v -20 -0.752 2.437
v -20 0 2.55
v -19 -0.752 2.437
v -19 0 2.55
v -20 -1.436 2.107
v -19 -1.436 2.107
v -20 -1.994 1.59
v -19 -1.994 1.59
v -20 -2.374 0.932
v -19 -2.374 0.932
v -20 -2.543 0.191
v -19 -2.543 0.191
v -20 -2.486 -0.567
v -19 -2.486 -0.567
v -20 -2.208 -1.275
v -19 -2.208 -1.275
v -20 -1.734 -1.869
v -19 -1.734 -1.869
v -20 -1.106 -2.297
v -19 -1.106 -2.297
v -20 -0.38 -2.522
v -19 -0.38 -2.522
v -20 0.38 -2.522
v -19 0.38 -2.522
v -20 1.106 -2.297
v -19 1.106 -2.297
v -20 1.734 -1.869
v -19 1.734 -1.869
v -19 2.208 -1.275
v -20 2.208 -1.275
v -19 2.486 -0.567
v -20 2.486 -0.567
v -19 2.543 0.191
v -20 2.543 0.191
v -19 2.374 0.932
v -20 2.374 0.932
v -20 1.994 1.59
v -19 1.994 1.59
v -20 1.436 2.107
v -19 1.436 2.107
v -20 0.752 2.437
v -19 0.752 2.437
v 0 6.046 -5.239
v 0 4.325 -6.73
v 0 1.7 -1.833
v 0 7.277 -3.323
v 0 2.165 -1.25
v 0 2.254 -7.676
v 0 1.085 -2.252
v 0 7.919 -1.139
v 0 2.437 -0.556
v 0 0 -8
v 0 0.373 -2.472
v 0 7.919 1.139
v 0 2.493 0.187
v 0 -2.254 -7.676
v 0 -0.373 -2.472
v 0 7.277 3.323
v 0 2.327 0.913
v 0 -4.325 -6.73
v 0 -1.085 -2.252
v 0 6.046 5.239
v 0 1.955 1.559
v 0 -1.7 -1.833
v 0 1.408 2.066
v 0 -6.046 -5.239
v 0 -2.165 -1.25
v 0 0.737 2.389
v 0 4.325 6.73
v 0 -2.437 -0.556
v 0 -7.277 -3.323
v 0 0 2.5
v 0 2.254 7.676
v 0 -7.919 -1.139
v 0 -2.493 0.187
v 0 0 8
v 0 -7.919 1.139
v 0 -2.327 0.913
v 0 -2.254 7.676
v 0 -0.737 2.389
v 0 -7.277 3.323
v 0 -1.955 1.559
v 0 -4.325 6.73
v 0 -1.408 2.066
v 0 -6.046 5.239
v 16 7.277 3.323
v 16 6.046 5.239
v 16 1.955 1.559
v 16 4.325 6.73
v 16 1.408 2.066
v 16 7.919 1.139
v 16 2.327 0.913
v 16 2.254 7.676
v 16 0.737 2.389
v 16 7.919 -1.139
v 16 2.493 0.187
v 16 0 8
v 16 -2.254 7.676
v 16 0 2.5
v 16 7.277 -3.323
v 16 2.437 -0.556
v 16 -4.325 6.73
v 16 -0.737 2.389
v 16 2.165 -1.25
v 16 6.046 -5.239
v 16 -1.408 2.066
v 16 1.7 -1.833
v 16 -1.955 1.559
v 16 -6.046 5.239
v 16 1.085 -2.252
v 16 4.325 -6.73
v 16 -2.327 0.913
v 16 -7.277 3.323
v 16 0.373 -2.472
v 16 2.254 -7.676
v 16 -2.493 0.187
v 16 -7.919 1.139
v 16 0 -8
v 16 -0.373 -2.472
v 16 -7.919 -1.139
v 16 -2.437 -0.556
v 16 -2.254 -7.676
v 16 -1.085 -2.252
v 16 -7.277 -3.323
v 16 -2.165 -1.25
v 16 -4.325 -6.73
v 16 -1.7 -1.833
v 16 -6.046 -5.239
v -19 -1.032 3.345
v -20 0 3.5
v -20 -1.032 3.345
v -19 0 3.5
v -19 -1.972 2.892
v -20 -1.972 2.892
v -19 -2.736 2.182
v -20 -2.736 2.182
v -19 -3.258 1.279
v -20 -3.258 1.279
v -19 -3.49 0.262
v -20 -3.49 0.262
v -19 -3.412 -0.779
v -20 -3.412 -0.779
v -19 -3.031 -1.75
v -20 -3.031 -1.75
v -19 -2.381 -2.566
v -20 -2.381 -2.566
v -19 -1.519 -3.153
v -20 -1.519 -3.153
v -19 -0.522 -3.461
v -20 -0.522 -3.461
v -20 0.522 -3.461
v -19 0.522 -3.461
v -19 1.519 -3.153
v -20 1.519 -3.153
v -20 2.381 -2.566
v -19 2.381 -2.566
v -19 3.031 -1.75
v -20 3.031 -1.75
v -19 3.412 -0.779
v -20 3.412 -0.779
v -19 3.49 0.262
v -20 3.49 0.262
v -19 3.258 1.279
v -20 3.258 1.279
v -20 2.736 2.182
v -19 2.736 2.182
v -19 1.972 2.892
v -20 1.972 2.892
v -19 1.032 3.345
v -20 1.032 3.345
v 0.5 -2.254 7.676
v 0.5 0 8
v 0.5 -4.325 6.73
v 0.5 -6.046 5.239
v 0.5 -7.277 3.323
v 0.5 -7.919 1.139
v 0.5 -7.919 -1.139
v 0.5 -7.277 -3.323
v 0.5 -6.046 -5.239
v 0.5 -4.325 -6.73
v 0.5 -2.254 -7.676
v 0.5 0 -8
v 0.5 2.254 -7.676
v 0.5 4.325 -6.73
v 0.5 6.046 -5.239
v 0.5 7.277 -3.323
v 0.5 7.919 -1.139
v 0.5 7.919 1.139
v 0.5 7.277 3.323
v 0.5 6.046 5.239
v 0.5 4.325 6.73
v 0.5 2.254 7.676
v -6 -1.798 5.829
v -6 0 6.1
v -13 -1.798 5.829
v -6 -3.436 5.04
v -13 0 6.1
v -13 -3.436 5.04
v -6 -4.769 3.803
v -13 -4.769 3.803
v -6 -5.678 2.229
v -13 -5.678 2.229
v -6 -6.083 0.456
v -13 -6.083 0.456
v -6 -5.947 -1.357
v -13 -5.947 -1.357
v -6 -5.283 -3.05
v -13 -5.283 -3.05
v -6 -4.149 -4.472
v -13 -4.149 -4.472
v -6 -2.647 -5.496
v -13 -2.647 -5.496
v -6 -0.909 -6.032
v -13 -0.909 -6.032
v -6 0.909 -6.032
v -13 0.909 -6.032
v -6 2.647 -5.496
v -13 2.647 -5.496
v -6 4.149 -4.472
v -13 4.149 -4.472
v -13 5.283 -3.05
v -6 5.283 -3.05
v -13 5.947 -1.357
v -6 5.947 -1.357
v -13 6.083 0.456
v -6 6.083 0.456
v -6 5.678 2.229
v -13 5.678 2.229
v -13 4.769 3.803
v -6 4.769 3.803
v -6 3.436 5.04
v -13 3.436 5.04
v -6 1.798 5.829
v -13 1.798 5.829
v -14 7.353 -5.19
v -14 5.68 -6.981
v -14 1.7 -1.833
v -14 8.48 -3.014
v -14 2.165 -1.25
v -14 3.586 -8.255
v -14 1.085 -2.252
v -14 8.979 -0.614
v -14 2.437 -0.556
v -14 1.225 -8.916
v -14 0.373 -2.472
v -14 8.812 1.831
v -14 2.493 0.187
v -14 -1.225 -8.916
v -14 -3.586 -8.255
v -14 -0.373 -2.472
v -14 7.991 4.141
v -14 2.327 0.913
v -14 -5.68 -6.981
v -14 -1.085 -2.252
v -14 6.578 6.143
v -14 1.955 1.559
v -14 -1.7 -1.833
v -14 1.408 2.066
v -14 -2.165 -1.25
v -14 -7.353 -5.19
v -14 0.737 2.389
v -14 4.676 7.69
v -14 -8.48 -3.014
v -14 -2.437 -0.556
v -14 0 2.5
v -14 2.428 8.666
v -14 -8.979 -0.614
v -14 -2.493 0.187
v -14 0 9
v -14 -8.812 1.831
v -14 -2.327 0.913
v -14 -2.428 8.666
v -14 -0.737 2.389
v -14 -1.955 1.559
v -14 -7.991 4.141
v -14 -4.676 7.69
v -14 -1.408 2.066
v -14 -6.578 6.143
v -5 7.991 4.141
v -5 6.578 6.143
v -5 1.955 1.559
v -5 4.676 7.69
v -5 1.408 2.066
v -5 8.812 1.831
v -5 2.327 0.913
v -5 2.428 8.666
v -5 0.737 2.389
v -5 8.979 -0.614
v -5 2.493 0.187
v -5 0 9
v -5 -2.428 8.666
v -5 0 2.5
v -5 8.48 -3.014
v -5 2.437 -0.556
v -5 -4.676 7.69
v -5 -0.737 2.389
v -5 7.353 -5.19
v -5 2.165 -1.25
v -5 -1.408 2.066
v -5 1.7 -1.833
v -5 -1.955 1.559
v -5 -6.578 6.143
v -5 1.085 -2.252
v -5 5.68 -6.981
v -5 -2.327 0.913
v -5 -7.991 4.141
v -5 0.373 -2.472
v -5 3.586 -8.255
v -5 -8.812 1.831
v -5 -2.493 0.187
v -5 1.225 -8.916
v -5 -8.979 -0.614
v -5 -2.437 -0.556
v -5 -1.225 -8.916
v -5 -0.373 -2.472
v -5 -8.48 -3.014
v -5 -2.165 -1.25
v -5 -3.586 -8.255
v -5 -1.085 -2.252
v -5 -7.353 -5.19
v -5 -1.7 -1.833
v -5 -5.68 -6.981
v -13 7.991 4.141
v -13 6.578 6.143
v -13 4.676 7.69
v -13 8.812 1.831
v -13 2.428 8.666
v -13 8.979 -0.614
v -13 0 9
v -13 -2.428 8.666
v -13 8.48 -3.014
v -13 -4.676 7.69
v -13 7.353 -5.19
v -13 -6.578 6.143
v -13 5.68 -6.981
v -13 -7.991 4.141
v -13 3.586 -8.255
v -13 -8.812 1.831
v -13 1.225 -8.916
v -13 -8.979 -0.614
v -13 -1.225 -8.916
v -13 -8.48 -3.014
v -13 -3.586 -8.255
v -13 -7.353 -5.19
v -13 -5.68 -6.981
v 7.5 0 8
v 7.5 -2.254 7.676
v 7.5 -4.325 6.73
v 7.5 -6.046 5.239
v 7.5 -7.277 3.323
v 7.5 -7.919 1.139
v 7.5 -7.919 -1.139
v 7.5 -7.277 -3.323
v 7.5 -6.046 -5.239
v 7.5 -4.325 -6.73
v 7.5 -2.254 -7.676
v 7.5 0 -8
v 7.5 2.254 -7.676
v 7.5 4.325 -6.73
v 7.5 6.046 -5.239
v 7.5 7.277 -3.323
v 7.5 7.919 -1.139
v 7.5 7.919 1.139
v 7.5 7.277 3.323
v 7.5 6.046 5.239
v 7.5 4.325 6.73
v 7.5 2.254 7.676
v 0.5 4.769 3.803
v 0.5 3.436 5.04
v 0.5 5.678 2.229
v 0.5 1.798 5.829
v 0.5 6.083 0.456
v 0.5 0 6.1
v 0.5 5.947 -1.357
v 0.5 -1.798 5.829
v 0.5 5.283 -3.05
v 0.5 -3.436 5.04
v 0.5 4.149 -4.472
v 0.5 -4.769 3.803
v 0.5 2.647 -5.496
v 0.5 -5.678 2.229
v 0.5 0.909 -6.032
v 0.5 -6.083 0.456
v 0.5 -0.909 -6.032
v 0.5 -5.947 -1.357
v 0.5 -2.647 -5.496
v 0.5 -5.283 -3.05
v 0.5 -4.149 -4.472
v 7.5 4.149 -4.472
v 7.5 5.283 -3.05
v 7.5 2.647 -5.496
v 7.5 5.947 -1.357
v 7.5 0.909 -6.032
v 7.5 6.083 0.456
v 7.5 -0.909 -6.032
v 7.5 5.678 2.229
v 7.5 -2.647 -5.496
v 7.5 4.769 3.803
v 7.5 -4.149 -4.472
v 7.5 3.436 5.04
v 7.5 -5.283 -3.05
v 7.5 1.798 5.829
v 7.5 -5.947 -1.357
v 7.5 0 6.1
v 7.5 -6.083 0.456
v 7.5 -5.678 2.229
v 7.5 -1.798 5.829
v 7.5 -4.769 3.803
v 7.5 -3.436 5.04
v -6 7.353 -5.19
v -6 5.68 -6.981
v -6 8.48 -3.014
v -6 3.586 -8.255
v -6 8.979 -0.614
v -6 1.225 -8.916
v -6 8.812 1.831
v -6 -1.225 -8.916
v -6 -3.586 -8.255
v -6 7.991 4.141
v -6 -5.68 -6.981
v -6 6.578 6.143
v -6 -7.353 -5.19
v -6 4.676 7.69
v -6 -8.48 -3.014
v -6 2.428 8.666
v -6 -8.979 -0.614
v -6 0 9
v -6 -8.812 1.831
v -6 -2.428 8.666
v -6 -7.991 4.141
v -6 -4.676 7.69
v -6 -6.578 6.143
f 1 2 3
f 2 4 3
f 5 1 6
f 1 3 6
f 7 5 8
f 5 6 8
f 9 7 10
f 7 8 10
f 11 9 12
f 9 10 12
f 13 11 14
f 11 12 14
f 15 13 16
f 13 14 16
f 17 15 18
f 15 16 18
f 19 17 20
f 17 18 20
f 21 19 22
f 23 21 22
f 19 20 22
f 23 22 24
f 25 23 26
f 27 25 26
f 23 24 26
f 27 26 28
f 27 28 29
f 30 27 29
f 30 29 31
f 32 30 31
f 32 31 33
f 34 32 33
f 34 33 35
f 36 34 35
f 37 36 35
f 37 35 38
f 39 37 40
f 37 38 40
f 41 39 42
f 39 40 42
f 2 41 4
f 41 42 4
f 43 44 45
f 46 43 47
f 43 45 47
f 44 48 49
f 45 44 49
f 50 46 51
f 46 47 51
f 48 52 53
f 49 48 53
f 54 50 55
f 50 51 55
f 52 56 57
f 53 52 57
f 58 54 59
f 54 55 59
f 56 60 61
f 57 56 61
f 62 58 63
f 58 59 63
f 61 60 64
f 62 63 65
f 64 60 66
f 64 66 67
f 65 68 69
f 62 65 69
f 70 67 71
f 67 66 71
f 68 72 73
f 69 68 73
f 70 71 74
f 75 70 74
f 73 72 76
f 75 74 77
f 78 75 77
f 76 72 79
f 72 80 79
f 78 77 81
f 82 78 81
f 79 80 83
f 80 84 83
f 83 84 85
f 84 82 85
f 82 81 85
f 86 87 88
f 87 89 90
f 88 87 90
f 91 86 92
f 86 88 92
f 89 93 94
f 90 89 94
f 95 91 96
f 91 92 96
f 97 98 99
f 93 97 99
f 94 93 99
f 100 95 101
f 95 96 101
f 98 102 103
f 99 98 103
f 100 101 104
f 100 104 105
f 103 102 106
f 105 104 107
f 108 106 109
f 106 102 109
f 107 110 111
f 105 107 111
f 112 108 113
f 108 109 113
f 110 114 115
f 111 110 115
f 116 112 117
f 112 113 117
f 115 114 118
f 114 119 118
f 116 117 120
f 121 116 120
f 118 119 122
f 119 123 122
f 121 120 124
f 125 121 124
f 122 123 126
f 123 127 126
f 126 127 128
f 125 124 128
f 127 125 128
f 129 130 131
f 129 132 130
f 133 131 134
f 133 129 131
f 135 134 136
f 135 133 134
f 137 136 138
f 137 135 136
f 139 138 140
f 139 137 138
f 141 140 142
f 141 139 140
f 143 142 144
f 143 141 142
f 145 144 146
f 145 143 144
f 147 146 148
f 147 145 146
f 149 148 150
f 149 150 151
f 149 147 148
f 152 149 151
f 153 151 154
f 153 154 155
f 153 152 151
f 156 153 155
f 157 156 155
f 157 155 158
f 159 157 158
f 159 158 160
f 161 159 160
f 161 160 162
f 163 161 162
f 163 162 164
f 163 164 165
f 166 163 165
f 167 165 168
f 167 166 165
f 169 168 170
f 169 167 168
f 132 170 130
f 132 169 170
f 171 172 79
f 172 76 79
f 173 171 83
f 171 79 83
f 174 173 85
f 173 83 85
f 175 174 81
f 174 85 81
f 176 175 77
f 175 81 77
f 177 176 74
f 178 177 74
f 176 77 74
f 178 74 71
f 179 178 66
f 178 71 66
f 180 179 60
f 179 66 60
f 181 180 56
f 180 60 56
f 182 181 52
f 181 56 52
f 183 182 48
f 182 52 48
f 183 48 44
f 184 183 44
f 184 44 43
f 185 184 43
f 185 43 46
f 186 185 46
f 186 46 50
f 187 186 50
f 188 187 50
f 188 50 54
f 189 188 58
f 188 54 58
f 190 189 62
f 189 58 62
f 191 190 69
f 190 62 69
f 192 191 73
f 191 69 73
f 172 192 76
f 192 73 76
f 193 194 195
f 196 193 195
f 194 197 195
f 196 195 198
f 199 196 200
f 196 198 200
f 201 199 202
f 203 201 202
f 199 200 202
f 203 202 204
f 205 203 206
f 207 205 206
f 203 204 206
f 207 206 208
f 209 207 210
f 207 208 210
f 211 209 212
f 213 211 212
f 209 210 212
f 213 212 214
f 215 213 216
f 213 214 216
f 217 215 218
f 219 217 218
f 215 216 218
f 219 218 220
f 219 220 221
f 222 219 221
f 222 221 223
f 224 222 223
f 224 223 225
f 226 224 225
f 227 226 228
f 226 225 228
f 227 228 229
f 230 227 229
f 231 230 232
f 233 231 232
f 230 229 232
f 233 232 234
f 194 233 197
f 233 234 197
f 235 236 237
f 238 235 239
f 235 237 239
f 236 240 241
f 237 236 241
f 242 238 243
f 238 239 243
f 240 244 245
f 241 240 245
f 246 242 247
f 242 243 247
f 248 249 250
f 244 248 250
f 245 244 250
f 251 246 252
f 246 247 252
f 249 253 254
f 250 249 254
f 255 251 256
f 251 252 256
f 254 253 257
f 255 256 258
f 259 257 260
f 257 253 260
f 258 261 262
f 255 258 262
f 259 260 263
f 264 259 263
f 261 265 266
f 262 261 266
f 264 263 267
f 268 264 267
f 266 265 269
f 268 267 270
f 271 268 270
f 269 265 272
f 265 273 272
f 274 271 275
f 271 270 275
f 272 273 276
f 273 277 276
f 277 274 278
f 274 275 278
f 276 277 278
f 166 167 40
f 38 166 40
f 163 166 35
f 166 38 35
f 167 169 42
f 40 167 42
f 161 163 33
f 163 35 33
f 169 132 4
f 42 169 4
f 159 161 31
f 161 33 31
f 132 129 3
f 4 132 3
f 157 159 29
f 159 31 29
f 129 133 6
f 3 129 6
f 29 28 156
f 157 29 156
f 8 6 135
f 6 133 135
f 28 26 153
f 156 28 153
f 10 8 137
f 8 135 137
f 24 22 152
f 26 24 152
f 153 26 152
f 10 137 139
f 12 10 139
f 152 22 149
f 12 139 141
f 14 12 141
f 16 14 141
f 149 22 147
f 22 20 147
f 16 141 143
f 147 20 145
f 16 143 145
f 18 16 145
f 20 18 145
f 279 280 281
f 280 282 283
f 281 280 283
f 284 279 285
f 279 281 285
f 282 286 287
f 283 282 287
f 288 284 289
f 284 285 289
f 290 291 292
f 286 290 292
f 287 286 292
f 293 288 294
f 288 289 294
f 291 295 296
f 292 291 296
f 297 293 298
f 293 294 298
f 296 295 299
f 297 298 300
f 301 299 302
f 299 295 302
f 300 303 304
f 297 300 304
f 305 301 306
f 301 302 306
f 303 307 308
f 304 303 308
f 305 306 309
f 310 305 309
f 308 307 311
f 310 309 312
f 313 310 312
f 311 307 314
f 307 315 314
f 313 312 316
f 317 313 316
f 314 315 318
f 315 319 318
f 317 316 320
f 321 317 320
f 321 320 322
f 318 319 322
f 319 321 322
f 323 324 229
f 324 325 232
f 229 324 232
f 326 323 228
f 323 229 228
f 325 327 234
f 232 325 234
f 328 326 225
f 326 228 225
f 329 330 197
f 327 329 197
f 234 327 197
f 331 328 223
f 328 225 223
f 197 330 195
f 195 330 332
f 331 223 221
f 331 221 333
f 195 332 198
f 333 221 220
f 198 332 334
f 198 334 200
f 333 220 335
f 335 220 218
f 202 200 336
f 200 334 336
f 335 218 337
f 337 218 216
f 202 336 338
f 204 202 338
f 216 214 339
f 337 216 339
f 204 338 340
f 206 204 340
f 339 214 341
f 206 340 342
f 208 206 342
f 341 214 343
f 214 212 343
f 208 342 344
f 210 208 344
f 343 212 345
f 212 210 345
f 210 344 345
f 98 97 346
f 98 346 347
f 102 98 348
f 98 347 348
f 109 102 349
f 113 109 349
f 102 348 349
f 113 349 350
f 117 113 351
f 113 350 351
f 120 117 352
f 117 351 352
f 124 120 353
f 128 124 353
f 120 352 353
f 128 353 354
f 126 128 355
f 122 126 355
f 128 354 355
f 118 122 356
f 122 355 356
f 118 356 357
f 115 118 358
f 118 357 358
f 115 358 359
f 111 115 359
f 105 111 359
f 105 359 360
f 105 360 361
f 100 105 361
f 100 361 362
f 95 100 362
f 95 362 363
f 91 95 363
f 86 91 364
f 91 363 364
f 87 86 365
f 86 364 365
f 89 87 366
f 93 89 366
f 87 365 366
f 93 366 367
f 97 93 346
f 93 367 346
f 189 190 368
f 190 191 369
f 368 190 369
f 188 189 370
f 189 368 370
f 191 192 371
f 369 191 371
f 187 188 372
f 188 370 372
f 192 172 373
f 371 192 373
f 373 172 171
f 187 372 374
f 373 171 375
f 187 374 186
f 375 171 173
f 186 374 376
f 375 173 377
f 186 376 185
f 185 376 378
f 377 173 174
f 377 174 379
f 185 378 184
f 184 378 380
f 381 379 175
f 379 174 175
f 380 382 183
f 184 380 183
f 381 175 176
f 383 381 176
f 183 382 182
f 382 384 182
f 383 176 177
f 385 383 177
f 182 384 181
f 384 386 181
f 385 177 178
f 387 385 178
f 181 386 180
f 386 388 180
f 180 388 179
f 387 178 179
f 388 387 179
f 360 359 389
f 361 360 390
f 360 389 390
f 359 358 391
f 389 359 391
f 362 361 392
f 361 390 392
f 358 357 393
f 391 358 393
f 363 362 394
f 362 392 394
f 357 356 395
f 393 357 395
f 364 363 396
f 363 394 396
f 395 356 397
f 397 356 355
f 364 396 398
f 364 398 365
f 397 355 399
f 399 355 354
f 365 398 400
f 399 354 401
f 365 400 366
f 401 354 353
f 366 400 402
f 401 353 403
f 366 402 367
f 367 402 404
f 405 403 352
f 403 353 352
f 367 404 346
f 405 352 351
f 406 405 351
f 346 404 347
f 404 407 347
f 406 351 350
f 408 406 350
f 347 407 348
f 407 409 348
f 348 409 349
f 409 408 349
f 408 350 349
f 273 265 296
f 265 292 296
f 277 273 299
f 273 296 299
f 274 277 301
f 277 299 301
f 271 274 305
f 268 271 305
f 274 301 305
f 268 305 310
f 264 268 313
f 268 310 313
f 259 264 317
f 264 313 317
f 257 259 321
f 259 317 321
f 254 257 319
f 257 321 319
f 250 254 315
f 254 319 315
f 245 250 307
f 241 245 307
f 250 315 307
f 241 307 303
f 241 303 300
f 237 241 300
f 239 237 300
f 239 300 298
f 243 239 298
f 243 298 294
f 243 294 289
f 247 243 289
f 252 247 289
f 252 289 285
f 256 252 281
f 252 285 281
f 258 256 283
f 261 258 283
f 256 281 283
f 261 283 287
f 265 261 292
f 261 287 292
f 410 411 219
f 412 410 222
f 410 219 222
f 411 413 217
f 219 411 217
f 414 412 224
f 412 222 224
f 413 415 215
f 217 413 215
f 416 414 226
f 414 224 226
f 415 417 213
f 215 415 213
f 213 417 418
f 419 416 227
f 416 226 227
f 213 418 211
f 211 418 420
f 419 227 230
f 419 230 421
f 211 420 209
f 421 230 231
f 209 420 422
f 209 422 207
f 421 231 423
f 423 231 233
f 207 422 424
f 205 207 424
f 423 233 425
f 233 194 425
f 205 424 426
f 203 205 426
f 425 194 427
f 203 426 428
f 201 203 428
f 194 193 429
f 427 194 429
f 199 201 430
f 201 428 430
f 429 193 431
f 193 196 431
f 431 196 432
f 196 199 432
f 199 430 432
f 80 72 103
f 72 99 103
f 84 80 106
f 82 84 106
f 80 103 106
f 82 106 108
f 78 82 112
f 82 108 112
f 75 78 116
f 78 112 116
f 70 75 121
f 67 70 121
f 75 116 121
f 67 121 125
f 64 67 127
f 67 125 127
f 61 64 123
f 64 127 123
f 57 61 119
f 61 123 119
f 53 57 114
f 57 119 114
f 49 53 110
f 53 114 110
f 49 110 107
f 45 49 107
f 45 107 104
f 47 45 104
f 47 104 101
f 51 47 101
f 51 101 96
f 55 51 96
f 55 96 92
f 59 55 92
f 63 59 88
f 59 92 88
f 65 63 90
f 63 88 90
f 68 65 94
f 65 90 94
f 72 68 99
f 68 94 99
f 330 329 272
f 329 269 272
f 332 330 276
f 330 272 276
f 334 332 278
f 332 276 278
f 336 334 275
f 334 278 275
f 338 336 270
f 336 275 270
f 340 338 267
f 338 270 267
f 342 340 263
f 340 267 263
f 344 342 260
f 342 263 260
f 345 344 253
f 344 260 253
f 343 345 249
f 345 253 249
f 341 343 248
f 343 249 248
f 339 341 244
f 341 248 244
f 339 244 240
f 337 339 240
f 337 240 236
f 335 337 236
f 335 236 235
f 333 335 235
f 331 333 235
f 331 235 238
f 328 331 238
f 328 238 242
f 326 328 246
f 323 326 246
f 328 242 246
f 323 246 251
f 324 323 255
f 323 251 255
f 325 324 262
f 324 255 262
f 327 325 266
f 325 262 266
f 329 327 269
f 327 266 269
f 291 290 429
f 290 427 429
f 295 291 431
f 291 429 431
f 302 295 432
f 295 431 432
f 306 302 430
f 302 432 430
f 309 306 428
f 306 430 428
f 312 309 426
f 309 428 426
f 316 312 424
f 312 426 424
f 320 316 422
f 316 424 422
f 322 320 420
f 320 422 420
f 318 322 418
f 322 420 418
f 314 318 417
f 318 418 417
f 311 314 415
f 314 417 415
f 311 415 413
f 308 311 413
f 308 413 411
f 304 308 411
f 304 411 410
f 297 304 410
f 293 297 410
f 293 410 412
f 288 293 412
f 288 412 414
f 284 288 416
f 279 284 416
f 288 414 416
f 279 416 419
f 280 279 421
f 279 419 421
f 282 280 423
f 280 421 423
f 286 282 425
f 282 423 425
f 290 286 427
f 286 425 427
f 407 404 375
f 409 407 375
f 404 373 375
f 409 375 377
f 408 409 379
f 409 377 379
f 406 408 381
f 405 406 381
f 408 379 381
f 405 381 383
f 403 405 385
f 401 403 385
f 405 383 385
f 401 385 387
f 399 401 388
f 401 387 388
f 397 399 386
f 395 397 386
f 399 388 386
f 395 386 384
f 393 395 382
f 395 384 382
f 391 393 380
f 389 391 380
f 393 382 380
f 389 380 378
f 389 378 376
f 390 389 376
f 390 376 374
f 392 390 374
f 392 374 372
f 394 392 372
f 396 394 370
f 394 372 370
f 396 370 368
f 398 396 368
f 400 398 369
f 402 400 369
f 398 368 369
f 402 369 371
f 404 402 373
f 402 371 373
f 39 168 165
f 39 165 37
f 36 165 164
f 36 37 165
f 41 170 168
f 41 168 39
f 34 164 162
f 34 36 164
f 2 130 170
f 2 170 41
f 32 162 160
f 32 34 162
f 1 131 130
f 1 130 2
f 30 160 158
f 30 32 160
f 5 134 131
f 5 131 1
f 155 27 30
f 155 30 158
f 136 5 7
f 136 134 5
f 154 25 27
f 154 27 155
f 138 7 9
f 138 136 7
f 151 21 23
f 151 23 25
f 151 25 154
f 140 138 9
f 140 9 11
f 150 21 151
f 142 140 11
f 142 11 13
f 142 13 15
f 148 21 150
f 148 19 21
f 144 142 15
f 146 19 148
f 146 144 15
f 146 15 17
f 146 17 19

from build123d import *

# Parameters (mm, degrees)
F0_W = 1
F0_H = 0.95


with BuildPart() as f1:
    # F0 (on Front) → F1 (revolve)
    with BuildSketch(Plane.XZ):
        Polygon((0, 8), (0, 2.5), (16, 2.5), (16, 8), (7.5, 8), (7.5, 6.1), (0.5, 6.1), (0.5, 8), align=None)
    revolve(axis=Axis((8, 0, 0), (1, 0, 0)))


with BuildPart() as f2:
    # F0 (on Front) → F2 (revolve)
    with BuildSketch(Plane.XZ):
        Polygon((-13, 9), (-14, 9), (-14, 2.5), (-5, 2.5), (-5, 9), (-6, 9), (-6, 6.1), (-13, 6.1), align=None)
    revolve(axis=Axis((8, 0, 0), (1, 0, 0)))


with BuildPart() as f3:
    # F0 (on Front) → F3 (revolve)
    with BuildSketch(Plane.XZ):
        with Locations((-19.5, 3.025)):
            Rectangle(F0_W, F0_H)
    revolve(axis=Axis((8, 0, 0), (1, 0, 0)))


solid = Compound([f1.part, f2.part, f3.part])
